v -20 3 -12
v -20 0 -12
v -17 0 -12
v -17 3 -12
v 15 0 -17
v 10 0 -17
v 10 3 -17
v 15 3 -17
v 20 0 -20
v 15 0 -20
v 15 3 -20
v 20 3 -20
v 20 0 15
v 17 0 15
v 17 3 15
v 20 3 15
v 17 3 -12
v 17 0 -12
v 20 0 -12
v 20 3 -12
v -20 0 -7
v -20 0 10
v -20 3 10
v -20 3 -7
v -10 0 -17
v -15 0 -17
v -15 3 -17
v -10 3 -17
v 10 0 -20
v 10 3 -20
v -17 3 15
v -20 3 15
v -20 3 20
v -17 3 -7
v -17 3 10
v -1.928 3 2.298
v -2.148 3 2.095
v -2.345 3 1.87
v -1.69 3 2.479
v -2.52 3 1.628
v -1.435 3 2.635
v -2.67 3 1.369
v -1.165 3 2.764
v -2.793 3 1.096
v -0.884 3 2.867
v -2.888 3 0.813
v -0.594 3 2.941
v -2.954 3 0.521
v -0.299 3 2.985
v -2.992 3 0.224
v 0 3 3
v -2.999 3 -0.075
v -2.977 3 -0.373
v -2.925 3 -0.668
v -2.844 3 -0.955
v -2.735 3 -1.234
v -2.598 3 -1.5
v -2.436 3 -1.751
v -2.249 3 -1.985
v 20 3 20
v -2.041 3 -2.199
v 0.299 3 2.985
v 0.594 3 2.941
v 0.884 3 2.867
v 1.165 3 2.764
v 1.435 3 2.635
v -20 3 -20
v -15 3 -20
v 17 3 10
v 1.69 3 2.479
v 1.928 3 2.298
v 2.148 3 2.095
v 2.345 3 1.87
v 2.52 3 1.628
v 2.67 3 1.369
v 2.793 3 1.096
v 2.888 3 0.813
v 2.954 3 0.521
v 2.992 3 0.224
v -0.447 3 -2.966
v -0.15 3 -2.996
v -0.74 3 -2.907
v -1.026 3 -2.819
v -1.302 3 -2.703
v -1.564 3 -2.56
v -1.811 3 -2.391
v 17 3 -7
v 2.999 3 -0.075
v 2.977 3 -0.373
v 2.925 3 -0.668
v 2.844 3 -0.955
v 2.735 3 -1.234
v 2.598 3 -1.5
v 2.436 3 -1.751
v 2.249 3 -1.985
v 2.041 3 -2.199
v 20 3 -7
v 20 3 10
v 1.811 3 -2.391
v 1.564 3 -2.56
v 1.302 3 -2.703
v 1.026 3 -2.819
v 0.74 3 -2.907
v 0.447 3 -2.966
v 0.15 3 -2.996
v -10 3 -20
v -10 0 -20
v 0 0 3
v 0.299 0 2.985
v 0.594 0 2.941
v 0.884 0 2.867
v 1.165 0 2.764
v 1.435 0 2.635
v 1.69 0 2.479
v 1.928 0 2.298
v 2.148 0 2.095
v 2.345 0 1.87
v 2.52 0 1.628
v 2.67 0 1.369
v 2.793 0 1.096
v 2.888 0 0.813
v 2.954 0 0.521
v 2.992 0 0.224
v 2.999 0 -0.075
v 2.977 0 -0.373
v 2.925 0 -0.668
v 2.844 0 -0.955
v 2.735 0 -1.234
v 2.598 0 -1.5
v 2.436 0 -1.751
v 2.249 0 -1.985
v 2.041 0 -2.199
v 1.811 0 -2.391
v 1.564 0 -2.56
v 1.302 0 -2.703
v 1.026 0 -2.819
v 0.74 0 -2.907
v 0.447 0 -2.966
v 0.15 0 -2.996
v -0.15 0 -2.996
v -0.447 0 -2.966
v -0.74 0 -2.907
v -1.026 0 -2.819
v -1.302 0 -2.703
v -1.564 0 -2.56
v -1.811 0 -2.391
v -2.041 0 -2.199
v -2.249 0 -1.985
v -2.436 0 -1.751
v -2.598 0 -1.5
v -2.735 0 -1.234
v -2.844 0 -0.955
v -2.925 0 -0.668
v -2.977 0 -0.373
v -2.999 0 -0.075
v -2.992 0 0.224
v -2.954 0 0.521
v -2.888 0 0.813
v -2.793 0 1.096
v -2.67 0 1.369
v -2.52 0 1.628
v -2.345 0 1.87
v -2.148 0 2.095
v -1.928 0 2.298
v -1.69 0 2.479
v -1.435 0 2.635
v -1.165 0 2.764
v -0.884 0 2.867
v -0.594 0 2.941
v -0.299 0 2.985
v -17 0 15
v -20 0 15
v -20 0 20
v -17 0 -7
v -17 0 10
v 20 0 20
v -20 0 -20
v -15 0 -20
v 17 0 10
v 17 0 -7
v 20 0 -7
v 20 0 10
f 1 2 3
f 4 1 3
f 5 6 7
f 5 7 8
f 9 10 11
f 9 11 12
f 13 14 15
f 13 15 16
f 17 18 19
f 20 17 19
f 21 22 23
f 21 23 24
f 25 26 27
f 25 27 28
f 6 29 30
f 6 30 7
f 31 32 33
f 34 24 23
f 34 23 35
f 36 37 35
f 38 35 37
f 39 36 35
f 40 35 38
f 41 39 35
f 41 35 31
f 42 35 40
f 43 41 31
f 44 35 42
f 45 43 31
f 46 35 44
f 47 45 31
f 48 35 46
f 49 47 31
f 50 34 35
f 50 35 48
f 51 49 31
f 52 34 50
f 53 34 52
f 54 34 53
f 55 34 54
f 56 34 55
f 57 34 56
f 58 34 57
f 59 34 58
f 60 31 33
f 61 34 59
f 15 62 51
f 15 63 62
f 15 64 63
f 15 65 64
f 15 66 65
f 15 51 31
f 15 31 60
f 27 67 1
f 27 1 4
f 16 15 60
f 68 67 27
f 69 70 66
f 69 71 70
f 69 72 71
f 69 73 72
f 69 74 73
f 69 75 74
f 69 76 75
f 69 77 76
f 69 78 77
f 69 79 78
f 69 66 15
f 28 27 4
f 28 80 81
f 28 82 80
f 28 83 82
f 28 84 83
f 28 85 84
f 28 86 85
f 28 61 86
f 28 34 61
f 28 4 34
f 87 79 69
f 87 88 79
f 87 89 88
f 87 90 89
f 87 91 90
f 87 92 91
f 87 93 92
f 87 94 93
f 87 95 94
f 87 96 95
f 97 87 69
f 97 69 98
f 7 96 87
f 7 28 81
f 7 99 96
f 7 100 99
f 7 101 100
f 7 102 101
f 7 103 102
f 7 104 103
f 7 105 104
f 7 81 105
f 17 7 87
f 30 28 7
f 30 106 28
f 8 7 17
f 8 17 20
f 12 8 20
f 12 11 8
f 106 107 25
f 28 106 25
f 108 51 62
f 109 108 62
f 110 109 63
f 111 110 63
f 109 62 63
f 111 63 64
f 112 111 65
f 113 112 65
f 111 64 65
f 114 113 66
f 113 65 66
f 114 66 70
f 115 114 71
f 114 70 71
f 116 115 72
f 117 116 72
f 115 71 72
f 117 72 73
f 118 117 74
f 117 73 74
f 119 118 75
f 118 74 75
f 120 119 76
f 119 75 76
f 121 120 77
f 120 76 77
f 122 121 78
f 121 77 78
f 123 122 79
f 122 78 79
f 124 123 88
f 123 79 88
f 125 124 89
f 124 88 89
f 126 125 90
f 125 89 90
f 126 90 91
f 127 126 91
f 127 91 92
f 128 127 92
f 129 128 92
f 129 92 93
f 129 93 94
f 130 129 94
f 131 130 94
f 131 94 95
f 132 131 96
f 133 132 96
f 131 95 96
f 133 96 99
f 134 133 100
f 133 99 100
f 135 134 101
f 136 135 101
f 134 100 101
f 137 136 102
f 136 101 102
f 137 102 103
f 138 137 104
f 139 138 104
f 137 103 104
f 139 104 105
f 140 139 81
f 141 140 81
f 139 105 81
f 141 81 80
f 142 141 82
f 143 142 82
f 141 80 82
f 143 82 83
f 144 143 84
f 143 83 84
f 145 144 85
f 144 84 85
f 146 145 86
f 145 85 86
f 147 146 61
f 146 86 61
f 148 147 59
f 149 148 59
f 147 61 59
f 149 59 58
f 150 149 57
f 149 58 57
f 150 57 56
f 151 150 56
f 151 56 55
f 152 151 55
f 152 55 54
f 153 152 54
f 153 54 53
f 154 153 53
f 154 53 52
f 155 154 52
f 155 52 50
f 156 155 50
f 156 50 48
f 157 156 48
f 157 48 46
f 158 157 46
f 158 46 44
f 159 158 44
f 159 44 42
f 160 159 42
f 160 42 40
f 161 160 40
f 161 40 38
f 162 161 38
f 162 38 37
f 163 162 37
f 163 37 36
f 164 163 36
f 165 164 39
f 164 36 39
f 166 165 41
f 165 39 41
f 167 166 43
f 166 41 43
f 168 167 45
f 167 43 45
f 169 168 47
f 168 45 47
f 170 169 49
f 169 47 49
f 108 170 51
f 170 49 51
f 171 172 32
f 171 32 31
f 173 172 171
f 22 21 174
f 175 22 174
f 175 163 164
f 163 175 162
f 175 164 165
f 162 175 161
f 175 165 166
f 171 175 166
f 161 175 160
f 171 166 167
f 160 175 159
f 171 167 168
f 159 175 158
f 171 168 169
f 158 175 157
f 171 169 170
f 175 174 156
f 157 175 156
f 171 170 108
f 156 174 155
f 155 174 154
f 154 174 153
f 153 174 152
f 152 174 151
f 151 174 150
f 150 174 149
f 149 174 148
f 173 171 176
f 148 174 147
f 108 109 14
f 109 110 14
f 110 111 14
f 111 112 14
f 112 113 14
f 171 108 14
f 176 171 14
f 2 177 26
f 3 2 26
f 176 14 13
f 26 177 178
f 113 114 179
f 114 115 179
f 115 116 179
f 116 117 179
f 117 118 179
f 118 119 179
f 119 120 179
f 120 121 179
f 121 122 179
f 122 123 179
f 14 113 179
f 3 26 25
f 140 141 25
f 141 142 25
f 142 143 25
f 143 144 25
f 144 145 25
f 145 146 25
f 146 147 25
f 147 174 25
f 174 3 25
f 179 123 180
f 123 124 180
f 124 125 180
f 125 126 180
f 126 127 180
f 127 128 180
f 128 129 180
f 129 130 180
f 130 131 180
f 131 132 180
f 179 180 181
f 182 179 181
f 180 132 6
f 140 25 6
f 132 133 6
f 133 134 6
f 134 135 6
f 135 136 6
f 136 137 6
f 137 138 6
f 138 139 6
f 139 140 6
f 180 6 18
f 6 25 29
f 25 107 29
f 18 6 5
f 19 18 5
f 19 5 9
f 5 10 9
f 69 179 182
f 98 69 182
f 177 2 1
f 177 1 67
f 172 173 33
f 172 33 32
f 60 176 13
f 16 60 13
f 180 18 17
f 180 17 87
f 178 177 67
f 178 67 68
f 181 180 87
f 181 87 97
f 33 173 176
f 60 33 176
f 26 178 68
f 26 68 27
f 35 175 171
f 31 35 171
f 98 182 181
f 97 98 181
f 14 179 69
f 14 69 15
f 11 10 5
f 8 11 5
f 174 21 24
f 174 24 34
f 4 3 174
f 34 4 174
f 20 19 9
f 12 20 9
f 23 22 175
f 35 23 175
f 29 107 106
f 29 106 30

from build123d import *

# Parameters (mm, degrees)
SKETCH1_W           = 40
SKETCH1_H           = 40
BOSS_EXTRUDE1_DEPTH = 3
SKETCH2_R           = 3
CUT_EXTRUDE1_DEPTH  = 3
SKETCH3_W           = 5
SKETCH3_H           = 3
CUT_EXTRUDE2_DEPTH  = 10
SKETCH4_W           = 3
SKETCH4_H           = 5
CUT_EXTRUDE3_DEPTH  = 3


with BuildPart() as part:
    # Sketch1 → Boss-Extrude1 (new body)
    with BuildSketch(Plane(origin=(0, 0, 0), x_dir=(1, 0, 0), z_dir=(0, 1, 0))):
        Rectangle(SKETCH1_W, SKETCH1_H)
    extrude(amount=BOSS_EXTRUDE1_DEPTH)

    # Sketch2 → Cut-Extrude1 (cut)
    with BuildSketch(Plane(origin=(0, 3, 0), x_dir=(1, 0, 0), z_dir=(0, 1, 0))):
        with Locations(Location((0, 0, 0), (0, 0, 270))):
            Circle(SKETCH2_R)
    extrude(amount=-CUT_EXTRUDE1_DEPTH, mode=Mode.SUBTRACT)

    # Sketch3 → Cut-Extrude2 (cut)
    with BuildSketch(Plane.XZ):
        with Locations((12.5, -18.5)):
            Rectangle(SKETCH3_W, SKETCH3_H)
        with Locations((-12.5, -18.5)):
            Rectangle(SKETCH3_W, SKETCH3_H)
    extrude(amount=-CUT_EXTRUDE2_DEPTH, mode=Mode.SUBTRACT)

    # Sketch4 → Cut-Extrude3 (cut)
    with BuildSketch(Plane.XZ):
        with Locations((18.5, 12.5)):
            Rectangle(SKETCH4_W, SKETCH4_H)
        with Locations((18.5, -9.5)):
            Rectangle(SKETCH4_W, SKETCH4_H)
        with Locations((-18.5, -9.5)):
            Rectangle(SKETCH4_W, SKETCH4_H)
        with Locations((-18.5, 12.5)):
            Rectangle(SKETCH4_W, SKETCH4_H)
    extrude(amount=-CUT_EXTRUDE3_DEPTH, mode=Mode.SUBTRACT)


solid = part.part
